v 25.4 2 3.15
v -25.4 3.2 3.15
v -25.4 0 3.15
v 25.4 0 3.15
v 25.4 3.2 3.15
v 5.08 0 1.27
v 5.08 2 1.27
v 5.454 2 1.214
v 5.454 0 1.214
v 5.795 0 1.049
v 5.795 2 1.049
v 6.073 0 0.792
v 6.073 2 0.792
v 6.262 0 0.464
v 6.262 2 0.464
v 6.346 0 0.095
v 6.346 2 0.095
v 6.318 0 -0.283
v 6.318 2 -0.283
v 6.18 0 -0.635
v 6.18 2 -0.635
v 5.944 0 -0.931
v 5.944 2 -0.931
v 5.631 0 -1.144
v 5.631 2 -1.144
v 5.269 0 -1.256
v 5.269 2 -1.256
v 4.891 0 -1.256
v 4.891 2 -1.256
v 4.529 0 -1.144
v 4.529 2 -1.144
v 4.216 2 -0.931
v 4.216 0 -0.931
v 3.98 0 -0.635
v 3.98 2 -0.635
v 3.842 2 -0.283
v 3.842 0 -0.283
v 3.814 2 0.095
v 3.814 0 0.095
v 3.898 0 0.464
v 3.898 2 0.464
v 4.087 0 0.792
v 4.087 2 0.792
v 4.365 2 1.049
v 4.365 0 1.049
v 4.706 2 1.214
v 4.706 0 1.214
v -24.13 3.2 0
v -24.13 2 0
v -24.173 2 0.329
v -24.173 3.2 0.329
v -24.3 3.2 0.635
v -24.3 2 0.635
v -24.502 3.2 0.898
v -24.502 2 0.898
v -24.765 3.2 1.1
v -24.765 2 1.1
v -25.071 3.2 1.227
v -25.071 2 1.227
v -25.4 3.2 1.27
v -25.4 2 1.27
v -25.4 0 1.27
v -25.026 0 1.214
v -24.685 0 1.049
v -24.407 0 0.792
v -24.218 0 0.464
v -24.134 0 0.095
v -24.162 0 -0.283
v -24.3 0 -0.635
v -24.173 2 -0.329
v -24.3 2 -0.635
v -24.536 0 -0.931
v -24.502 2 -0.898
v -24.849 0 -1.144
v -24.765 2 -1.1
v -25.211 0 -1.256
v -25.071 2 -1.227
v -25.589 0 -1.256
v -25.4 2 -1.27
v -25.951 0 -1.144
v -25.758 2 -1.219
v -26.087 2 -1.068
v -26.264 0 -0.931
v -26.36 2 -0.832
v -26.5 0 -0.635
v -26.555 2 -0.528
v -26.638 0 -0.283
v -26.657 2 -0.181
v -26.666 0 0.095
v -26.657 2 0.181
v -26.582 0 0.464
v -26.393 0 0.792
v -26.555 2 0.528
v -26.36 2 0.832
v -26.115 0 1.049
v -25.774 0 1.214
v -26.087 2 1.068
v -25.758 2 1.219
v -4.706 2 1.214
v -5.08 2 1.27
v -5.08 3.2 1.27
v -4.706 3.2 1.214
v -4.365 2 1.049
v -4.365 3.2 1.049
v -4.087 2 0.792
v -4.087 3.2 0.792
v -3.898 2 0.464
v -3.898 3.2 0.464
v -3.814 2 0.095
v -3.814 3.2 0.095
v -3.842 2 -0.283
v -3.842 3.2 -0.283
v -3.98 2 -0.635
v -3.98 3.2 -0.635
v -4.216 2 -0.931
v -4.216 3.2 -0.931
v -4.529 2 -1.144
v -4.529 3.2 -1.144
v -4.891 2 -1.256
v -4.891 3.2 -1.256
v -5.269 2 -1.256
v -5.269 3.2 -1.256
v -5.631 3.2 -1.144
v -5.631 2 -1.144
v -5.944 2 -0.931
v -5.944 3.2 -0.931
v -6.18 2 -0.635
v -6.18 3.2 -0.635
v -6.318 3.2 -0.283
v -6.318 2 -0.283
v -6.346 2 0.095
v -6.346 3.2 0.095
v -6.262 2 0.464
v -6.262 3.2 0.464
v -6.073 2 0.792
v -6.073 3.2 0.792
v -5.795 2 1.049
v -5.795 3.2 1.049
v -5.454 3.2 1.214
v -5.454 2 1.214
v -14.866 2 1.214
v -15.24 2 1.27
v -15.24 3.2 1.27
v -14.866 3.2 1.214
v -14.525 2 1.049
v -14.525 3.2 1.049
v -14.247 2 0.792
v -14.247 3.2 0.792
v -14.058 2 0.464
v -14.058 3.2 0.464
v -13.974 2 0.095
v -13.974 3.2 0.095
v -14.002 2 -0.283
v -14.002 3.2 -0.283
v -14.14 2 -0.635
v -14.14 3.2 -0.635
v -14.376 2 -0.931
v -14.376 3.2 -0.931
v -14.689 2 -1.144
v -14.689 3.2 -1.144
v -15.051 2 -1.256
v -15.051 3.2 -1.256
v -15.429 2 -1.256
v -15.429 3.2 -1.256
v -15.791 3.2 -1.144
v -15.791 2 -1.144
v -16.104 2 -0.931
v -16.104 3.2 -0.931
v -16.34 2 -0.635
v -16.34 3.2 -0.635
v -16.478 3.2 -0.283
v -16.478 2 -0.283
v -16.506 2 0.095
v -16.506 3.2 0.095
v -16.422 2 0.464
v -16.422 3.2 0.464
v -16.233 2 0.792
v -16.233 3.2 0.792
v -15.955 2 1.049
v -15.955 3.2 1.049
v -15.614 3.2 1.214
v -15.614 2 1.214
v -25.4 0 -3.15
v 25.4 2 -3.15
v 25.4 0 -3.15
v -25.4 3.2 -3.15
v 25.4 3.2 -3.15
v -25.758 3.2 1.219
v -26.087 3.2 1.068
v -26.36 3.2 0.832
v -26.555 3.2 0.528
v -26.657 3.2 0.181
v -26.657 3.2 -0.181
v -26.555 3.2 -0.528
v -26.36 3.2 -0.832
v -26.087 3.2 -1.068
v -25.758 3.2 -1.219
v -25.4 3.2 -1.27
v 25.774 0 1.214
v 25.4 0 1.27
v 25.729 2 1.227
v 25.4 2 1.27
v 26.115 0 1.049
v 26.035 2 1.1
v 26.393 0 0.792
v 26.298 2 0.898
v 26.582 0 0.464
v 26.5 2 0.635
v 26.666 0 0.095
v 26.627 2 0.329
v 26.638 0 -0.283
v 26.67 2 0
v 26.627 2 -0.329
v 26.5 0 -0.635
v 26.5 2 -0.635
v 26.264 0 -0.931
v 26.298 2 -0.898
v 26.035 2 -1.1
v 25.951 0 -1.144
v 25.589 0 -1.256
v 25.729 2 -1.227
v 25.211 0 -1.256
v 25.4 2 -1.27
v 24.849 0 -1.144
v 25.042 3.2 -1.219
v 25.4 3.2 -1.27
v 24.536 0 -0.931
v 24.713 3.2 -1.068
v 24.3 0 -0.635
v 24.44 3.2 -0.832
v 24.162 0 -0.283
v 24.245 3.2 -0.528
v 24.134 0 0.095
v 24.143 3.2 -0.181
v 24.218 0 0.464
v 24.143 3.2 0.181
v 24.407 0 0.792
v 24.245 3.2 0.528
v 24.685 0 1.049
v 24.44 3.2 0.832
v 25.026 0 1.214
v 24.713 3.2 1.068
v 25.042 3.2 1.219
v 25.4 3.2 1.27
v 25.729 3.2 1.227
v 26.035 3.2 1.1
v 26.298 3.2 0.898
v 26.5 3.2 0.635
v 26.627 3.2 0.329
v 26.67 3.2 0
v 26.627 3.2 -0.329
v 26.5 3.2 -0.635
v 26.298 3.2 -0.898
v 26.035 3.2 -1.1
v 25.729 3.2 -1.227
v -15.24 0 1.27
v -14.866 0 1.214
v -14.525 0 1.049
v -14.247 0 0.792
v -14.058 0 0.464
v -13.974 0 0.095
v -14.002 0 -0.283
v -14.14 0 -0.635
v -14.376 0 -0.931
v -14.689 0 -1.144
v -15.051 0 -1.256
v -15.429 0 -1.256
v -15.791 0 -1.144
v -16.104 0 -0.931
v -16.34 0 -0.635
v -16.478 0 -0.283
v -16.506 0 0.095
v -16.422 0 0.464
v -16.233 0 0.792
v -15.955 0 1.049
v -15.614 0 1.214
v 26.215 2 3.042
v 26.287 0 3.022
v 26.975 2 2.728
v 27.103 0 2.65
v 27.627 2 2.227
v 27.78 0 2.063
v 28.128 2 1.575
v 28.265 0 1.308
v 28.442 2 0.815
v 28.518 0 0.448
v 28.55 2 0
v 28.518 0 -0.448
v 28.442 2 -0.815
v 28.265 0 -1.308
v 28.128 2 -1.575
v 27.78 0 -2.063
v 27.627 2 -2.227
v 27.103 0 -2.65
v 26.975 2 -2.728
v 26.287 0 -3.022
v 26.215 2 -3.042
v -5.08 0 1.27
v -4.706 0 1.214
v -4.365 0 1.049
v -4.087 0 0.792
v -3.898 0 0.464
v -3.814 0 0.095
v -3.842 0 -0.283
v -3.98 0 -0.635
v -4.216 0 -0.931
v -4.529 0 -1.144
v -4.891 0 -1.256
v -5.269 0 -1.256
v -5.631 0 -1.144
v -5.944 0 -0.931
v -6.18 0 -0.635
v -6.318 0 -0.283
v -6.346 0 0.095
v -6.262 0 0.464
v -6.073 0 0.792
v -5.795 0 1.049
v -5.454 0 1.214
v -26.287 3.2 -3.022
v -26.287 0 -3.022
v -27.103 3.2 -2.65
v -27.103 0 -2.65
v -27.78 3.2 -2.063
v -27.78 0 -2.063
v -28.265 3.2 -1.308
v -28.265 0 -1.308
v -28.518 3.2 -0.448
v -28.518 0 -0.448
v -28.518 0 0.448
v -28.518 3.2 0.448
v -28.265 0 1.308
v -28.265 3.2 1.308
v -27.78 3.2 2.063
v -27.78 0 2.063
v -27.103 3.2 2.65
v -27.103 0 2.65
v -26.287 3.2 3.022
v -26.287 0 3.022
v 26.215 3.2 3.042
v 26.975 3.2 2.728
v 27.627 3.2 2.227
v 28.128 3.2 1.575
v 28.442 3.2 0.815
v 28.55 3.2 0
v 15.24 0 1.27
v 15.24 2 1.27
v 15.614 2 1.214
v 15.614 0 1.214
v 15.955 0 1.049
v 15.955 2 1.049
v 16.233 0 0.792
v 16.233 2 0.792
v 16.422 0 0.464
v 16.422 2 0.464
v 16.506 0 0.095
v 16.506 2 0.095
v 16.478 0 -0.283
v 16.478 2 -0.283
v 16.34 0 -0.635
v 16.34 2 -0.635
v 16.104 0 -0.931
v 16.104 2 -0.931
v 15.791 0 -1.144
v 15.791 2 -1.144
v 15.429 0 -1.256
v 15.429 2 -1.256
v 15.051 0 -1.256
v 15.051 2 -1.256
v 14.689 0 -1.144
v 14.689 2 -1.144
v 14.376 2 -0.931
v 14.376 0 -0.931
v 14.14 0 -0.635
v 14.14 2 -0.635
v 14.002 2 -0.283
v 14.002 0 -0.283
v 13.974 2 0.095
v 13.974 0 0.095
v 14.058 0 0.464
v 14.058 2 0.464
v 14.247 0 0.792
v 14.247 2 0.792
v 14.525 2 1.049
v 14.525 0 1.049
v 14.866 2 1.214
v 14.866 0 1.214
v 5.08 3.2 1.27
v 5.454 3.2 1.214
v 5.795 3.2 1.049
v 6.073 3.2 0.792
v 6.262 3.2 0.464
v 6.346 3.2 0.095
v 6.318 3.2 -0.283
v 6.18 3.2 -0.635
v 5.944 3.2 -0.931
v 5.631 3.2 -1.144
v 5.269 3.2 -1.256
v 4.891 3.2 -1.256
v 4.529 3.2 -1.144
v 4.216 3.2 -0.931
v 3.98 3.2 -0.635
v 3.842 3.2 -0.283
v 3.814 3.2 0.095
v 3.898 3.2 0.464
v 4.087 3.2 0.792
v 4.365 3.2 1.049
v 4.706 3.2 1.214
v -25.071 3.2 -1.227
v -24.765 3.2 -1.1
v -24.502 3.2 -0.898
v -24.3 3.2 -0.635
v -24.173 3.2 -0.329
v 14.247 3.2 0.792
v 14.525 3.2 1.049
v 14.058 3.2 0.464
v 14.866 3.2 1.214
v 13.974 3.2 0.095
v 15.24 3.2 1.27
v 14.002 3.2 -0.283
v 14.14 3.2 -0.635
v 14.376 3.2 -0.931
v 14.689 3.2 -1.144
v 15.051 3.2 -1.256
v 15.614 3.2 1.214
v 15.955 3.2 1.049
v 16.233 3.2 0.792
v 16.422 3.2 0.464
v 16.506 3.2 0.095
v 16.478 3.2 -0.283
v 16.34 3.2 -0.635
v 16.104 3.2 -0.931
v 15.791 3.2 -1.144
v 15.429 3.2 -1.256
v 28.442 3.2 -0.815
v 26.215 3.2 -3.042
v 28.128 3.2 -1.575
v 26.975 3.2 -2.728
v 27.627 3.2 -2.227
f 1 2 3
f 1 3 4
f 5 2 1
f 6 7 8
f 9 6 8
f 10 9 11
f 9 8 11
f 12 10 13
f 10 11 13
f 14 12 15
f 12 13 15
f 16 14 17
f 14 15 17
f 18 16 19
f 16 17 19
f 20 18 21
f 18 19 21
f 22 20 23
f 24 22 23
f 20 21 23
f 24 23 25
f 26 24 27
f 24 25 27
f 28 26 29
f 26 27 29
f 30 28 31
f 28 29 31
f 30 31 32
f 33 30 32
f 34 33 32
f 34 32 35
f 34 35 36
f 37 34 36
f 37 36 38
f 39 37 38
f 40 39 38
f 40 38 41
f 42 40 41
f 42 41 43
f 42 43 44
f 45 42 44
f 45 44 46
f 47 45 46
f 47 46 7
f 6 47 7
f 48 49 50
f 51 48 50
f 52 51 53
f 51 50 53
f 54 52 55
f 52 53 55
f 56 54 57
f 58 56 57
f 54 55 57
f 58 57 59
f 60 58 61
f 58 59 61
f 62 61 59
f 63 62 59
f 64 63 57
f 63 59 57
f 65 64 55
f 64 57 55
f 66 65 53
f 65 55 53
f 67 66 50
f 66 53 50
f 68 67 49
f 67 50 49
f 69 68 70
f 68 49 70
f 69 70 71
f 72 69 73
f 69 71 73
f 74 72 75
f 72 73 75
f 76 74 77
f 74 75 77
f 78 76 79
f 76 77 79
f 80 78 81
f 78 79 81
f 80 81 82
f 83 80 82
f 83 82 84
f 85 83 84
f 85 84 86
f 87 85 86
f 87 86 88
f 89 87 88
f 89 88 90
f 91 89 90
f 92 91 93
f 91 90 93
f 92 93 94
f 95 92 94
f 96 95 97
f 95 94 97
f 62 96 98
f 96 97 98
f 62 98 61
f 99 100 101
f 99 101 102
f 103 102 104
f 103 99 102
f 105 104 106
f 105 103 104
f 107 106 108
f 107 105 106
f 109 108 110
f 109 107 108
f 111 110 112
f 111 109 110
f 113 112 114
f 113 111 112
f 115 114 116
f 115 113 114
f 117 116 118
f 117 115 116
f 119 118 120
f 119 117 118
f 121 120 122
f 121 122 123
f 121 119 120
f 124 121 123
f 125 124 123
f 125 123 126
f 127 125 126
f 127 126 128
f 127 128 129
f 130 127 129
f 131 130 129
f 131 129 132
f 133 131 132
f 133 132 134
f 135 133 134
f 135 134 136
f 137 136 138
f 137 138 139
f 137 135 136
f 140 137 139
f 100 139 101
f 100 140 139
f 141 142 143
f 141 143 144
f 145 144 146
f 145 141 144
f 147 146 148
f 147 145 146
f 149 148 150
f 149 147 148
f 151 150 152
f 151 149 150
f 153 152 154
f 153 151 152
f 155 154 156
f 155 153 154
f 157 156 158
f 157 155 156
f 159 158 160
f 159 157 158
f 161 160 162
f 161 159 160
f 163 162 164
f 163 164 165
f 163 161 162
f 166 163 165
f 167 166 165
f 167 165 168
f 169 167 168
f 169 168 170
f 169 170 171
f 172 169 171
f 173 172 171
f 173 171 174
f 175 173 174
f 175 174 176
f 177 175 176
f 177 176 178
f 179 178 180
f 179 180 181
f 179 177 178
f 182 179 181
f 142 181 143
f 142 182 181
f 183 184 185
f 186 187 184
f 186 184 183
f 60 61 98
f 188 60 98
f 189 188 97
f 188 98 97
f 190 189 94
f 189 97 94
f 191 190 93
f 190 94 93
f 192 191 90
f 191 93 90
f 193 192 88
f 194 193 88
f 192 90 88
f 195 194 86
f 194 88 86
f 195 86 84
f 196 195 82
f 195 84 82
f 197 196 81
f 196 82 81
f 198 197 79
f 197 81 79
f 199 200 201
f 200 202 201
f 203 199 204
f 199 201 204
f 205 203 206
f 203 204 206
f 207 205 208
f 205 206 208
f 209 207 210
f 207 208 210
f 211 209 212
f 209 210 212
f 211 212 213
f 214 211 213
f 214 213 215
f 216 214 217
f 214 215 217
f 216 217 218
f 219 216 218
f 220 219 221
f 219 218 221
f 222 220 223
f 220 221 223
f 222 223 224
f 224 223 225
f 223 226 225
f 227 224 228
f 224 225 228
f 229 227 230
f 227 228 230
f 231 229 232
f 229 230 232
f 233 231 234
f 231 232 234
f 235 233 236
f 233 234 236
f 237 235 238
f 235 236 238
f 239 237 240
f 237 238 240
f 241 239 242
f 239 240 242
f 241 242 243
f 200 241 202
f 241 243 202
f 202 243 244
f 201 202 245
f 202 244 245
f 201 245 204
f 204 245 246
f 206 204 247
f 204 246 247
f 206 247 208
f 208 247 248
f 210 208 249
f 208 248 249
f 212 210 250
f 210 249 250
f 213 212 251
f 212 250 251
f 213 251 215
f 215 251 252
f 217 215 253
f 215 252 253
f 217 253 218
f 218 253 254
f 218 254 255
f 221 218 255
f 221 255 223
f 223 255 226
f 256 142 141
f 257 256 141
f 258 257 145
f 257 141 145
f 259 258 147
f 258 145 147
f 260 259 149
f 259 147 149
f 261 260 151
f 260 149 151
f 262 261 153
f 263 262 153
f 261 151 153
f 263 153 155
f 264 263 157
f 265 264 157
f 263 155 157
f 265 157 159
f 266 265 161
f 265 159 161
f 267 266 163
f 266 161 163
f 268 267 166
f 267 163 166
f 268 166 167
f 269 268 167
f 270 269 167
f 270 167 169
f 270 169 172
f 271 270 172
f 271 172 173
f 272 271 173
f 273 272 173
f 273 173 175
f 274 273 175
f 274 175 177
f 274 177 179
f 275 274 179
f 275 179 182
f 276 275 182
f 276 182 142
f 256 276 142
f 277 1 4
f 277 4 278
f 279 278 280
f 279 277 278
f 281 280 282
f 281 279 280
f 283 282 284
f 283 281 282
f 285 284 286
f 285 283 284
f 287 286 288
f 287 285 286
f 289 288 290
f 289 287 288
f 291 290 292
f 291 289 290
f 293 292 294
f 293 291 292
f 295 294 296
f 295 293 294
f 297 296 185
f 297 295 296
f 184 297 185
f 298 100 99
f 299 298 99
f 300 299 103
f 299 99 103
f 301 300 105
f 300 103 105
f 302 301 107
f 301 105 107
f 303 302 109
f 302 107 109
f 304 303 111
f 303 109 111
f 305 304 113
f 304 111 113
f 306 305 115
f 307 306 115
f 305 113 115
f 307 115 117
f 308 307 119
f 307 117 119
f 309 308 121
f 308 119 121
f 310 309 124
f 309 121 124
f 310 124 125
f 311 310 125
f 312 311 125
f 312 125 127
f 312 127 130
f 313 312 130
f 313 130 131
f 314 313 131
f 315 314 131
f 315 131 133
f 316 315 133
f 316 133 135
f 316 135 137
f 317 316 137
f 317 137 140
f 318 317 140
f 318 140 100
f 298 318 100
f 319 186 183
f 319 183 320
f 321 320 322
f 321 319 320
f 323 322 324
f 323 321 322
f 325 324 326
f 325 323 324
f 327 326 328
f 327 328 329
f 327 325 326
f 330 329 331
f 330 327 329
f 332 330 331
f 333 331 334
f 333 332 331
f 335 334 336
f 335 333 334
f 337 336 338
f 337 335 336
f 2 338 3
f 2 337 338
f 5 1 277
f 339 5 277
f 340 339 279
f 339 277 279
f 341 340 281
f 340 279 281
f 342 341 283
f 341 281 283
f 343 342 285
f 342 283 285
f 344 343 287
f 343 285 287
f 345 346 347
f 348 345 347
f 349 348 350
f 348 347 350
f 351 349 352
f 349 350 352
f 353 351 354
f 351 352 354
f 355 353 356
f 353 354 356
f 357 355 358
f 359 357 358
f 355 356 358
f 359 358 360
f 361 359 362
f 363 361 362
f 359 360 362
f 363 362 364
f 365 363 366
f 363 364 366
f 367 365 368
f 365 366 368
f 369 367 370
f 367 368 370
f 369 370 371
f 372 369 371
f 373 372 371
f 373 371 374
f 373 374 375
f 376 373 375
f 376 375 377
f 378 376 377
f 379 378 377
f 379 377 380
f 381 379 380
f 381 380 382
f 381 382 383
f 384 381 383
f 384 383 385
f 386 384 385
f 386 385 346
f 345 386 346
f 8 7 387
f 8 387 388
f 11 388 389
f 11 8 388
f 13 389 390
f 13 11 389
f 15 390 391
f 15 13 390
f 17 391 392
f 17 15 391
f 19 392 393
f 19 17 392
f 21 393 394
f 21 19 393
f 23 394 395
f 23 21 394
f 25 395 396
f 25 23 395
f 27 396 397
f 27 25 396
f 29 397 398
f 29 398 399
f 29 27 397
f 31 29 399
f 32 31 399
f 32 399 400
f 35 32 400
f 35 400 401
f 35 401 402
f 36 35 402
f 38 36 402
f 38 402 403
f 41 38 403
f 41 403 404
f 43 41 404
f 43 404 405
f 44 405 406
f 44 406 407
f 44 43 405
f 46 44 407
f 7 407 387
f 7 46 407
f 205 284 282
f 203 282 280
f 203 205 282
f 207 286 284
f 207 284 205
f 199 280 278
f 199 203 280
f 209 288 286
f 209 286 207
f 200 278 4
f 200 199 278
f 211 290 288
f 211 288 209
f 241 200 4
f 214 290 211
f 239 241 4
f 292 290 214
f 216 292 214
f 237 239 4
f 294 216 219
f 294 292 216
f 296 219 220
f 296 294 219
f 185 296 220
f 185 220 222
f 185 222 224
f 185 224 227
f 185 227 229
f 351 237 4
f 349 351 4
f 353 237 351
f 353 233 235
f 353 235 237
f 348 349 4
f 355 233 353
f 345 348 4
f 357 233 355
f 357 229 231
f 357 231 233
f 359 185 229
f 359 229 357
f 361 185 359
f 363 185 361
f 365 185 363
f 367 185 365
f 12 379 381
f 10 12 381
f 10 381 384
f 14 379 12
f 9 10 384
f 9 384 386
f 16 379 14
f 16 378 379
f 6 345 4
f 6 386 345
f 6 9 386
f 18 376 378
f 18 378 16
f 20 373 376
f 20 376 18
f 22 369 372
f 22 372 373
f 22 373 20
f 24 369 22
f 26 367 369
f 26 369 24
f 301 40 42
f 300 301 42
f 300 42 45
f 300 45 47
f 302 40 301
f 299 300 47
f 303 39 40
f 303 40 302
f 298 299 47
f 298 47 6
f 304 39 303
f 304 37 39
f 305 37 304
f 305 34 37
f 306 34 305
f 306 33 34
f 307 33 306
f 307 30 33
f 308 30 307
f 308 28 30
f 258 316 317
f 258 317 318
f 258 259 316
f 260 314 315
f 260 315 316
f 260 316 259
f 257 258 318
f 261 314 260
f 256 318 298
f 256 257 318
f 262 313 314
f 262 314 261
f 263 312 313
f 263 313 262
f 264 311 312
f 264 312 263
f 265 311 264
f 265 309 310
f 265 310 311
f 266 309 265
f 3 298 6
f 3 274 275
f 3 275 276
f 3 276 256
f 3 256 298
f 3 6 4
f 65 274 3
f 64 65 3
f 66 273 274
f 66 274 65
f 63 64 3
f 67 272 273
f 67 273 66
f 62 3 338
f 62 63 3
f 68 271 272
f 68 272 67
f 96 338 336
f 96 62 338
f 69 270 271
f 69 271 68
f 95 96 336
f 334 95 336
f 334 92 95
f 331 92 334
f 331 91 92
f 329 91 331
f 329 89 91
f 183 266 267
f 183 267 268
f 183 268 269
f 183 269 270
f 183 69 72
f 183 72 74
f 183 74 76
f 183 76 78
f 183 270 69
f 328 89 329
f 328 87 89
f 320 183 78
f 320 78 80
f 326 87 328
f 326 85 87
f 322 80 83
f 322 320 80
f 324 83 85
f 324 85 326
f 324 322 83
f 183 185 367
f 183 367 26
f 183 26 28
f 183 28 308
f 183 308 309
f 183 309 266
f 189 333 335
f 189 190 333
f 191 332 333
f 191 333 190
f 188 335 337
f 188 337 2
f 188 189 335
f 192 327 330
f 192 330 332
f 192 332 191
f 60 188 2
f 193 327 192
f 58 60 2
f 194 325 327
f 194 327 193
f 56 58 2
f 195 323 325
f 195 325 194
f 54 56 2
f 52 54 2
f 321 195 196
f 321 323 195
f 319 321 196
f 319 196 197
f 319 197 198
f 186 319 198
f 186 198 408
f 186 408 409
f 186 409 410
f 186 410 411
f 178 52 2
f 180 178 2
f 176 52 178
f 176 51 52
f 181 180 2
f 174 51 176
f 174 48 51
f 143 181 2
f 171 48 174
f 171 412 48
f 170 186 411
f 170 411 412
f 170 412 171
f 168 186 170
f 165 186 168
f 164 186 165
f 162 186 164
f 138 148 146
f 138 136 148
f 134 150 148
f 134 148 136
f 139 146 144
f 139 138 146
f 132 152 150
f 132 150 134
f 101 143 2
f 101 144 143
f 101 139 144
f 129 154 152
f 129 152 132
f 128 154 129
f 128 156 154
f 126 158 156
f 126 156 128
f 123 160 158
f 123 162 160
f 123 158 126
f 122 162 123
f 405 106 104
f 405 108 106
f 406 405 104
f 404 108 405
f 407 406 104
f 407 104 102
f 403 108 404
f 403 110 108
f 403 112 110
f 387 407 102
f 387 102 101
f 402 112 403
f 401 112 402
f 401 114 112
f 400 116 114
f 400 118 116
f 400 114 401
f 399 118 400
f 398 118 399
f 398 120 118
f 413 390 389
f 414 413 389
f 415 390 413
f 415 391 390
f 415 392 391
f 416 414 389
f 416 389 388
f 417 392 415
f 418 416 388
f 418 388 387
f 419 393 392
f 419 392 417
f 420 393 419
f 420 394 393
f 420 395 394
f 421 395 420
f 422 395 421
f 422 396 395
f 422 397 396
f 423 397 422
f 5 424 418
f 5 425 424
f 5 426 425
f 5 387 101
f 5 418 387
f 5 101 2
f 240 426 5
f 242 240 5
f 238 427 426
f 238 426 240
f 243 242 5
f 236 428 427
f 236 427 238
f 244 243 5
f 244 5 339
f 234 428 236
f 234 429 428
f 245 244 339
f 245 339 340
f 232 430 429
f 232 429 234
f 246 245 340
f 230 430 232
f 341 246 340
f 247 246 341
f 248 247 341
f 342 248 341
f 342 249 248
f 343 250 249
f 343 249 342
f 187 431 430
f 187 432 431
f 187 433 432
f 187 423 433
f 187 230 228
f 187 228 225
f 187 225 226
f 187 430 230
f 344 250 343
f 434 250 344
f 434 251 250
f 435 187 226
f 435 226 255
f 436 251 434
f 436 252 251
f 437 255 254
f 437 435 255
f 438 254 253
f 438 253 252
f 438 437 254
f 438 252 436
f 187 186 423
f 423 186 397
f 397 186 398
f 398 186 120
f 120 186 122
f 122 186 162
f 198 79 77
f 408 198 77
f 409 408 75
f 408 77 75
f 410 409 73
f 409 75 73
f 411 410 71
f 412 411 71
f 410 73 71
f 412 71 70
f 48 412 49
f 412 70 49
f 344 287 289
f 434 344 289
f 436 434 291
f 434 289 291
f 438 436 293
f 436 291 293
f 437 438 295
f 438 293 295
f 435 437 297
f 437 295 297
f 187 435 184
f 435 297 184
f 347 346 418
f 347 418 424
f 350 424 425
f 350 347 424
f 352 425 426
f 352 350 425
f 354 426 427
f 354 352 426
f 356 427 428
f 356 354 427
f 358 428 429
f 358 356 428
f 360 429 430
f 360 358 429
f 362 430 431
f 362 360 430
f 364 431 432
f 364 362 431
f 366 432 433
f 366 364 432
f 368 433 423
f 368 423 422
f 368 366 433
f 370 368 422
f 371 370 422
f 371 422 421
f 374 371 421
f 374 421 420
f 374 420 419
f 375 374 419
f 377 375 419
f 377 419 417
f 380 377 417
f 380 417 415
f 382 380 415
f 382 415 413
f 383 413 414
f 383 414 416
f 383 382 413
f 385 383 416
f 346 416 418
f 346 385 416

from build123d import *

# Parameters (mm, degrees)
BOSS_EXTRUDE1_DEPTH     = 2
SKETCH2_R               = 1.27
BOSS_EXTRUDE2_DEPTH     = 1.2
CUT_EXTRUDE1_DEPTH      = 35.254233315
CUT_EXTRUDE1_DEPTH_BACK = 35.254233315
SKETCH2_3_R             = 1.27
CUT_EXTRUDE2_DEPTH      = 35.254233315


with BuildPart() as part:
    # Sketch1 → Boss-Extrude1 (new body)
    with BuildSketch(Plane(origin=(0, 0, 0), x_dir=(1, 0, 0), z_dir=(0, 1, 0))):
        with BuildLine():
            Line((24.13, -8.89), (-24.13, -8.89))
            ThreePointArc((-24.13, -8.89), (-33.02, 0), (-24.13, 8.89))
            Line((-24.13, 8.89), (24.13, 8.89))
            ThreePointArc((24.13, 8.89), (33.02, 0), (24.13, -8.89))
        make_face()
    extrude(amount=BOSS_EXTRUDE1_DEPTH)

    # Sketch2 → Boss-Extrude2 (add)
    with BuildSketch(Plane(origin=(0, 2, 0), x_dir=(1, 0, 0), z_dir=(0, 1, 0))):
        with BuildLine():
            ThreePointArc((-25.4, 3.1496), (-28.5496, 0), (-25.4, -3.1496))
            Line((-25.4, -3.1496), (25.4, -3.1496))
            ThreePointArc((25.4, -3.1496), (28.5496, 0), (25.4, 3.1496))
            Line((25.4, 3.1496), (-25.4, 3.1496))
        make_face()
        with Locations((-25.4, 0)):
            Circle(SKETCH2_R, mode=Mode.SUBTRACT)
        with Locations((-15.24, 0)):
            Circle(SKETCH2_R, mode=Mode.SUBTRACT)
        with Locations((-5.08, 0)):
            Circle(SKETCH2_R, mode=Mode.SUBTRACT)
        with Locations((5.08, 0)):
            Circle(SKETCH2_R, mode=Mode.SUBTRACT)
        with Locations((15.24, 0)):
            Circle(SKETCH2_R, mode=Mode.SUBTRACT)
        with Locations((25.4, 0)):
            Circle(SKETCH2_R, mode=Mode.SUBTRACT)
    extrude(amount=BOSS_EXTRUDE2_DEPTH)

    # Sketch2<3> → Cut-Extrude1 (cut, two sides: drawn at the far end of the back side and taken through both)
    with BuildSketch(Plane(origin=(0, 2, 0), x_dir=(1, 0, 0), z_dir=(0, 1, 0)).offset(-CUT_EXTRUDE1_DEPTH_BACK)):
        with Locations((-25.4, 0)):
            Circle(SKETCH2_3_R)
        with Locations((-15.24, 0)):
            Circle(SKETCH2_3_R)
        with Locations((-5.08, 0)):
            Circle(SKETCH2_3_R)
        with Locations((5.08, 0)):
            Circle(SKETCH2_3_R)
        with Locations((15.24, 0)):
            Circle(SKETCH2_3_R)
        with Locations((25.4, 0)):
            Circle(SKETCH2_3_R)
    extrude(amount=CUT_EXTRUDE1_DEPTH + CUT_EXTRUDE1_DEPTH_BACK, mode=Mode.SUBTRACT)

    # Sketch3 → Cut-Extrude2 (cut, through all)
    with BuildSketch(Plane(origin=(0, 2, 0), x_dir=(1, 0, 0), z_dir=(0, 1, 0))):
        with BuildLine():
            Line((24.13, 8.89), (-24.13, 8.89))
            ThreePointArc((-24.13, 8.89), (-33.02, 0), (-24.13, -8.89))
            Line((-24.13, -8.89), (24.13, -8.89))
            ThreePointArc((24.13, -8.89), (33.02, 0), (24.13, 8.89))
        make_face()
        with BuildLine():
            Line((-25.4, -3.1496), (25.4, -3.1496))
            ThreePointArc((25.4, -3.1496), (28.5496, 0), (25.4, 3.1496))
            Line((25.4, 3.1496), (-25.4, 3.1496))
            ThreePointArc((-25.4, 3.1496), (-28.5496, 0), (-25.4, -3.1496))
        make_face(mode=Mode.SUBTRACT)
    extrude(amount=-CUT_EXTRUDE2_DEPTH, mode=Mode.SUBTRACT)


solid = part.part
